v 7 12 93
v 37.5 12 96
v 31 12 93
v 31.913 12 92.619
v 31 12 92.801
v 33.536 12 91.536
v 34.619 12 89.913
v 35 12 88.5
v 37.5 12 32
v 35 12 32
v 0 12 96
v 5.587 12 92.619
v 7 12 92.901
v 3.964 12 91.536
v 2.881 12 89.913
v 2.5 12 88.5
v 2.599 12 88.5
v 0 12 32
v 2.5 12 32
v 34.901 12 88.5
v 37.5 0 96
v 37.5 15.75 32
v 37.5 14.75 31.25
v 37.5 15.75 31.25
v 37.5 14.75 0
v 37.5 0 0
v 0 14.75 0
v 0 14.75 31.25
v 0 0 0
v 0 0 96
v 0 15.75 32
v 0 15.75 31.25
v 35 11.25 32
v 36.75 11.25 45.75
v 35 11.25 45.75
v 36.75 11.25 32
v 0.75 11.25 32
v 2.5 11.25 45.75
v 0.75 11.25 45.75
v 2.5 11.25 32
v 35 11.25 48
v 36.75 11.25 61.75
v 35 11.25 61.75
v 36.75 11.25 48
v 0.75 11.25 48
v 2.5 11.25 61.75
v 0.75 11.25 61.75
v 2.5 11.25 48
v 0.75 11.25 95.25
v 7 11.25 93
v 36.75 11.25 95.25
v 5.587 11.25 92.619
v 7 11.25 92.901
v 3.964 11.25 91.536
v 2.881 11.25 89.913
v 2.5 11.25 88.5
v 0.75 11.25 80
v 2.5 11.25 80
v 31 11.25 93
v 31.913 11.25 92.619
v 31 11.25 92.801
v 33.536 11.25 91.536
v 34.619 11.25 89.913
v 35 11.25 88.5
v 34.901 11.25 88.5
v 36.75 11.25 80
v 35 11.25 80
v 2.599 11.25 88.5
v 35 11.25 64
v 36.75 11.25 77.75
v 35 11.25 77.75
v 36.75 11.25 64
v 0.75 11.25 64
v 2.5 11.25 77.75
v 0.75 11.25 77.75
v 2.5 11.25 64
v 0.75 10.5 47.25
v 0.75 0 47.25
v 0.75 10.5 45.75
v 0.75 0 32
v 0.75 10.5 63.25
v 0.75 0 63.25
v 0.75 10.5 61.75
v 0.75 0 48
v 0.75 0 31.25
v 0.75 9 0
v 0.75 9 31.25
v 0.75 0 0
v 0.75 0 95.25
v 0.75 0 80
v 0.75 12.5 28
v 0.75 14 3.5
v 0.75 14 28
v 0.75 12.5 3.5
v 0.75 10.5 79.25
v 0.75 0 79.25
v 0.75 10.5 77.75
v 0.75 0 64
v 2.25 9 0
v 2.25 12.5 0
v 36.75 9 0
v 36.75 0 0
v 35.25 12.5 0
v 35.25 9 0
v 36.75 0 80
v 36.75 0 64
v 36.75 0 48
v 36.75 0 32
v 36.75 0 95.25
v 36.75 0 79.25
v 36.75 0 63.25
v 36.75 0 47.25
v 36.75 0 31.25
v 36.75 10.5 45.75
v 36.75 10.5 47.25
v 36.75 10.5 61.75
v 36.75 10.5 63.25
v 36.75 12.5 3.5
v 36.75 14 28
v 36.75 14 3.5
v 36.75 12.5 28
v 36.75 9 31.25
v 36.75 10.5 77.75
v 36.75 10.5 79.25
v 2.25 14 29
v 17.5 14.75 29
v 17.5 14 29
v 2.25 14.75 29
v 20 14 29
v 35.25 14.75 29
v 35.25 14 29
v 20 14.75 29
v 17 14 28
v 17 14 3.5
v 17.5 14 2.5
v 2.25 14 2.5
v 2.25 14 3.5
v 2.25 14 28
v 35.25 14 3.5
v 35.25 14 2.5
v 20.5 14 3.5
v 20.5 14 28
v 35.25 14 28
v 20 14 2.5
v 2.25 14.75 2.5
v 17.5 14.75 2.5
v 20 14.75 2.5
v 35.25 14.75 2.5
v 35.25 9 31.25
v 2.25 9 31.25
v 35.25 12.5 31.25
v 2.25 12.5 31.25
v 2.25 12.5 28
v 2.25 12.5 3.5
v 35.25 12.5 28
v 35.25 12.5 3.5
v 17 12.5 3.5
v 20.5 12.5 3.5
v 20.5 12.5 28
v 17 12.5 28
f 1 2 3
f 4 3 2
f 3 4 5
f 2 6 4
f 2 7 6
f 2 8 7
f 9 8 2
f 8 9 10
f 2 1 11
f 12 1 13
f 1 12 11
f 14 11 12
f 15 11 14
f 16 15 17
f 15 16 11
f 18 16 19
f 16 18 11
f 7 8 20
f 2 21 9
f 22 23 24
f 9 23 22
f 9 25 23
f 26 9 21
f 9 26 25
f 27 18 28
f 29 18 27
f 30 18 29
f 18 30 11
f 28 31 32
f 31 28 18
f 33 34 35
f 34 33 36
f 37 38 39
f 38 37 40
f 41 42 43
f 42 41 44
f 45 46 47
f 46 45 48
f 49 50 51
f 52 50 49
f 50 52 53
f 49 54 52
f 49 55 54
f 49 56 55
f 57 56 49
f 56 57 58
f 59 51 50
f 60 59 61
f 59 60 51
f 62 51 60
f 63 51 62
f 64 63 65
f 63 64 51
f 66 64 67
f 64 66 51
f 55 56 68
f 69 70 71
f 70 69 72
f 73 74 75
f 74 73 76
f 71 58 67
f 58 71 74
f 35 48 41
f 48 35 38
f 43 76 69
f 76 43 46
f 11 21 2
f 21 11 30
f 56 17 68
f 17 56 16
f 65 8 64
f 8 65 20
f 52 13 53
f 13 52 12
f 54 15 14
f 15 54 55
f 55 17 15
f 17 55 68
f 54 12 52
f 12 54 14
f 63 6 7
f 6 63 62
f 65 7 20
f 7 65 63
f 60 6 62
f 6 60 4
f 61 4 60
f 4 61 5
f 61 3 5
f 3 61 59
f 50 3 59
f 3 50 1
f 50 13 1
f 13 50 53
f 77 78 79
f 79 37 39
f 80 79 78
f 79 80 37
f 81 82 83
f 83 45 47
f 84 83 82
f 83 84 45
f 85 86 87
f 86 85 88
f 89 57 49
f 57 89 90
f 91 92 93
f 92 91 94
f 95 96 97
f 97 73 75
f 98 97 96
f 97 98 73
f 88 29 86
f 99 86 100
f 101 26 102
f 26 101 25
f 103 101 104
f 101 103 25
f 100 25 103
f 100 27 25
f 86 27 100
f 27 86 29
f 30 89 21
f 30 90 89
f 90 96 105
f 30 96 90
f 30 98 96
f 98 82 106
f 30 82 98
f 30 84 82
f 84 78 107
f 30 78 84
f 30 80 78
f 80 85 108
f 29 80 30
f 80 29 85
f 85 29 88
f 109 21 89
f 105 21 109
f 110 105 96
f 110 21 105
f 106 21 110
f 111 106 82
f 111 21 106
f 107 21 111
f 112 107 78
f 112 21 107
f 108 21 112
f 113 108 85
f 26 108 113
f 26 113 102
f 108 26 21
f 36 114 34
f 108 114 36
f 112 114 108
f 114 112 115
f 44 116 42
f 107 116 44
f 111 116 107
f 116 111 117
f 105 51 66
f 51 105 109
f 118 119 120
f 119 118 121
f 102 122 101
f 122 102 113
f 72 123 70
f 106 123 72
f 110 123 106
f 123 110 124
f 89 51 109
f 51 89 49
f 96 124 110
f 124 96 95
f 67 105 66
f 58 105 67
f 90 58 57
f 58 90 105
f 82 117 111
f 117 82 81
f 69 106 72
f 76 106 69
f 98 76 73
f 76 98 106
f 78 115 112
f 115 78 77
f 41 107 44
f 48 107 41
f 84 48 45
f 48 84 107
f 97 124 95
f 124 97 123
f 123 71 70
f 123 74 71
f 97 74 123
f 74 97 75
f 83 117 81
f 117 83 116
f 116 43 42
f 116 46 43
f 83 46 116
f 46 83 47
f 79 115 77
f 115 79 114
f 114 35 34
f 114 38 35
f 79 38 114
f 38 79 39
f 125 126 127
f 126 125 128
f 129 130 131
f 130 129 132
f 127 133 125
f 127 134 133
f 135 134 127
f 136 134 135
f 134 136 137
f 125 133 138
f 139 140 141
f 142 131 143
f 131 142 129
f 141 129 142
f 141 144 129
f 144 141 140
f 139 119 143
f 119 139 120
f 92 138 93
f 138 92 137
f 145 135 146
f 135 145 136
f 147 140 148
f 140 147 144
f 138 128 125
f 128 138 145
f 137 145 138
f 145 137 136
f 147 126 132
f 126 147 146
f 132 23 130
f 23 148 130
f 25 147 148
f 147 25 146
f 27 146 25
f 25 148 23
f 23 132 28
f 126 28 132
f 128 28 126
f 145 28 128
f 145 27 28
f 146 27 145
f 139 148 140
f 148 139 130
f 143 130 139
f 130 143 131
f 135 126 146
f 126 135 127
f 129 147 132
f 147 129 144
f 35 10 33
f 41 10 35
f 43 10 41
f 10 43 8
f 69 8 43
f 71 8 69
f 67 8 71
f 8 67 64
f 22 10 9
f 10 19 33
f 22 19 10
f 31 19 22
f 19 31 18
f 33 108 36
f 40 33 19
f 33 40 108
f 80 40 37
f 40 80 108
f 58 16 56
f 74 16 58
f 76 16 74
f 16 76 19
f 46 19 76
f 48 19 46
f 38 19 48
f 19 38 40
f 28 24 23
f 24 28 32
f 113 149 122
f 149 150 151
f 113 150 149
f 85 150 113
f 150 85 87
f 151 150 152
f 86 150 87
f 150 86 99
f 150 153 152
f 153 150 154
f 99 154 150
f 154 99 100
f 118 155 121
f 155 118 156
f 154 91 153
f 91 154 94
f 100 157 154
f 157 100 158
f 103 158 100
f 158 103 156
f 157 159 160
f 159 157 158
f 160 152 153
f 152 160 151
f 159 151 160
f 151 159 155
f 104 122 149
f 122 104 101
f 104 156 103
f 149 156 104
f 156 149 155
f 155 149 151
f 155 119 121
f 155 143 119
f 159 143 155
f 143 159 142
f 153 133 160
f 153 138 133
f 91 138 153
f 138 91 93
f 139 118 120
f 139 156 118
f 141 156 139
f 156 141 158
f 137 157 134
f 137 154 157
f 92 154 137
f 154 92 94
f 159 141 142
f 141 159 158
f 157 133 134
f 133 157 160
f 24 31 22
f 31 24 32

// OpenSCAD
// file: lumber.scad
//----------------------------------------------------------------------
//------------ openscad module for common (framing) lumber -------------
// A.P. Ruymgaart 5/2015
//------------------------------- notes --------------------------------
// This work is licensed under a creative commons license:
// Attribution-NonCommercial 4.0 International (CC BY-NC 4.0) 
// You are free to:
//    Share - copy and redistribute the material in any medium or format
//    Adapt - remix, transform, and build upon the material 
// Under the following terms:\
//    Attribution - You must give appropriate credit, provide a link to the license, 
//    and indicate if changes were made. You may do so in any reasonable manner, 
//    but not in any way that suggests the licensor endorses you or your use.
//
// NonCommercial - You may not use the material for commercial purposes. 
// https://creativecommons.org/licenses/by-nc/4.0/legalcode
//----------------------------------------------------------------------

h1xX = 0.75;

w2x2 = 1.5;
w2x4 = 3.5;
w4x4 = 3.5;
w2x6 = 5.5;
w2x8 = 7.5;
w2x10 = 9.5;

d2x4 = 1.5;
d2x6 = 1.5;
d2x8 = 1.5;
d2x10 = 1.5;

w14x14 = 14.0;

opacityFrame = 1.0;


//----------------------------------------------------------------------
module ss1x8(x, y, z, rx, ry, rz, length, color="green", opc=1.0) 
{
   echo("====> LUMBER: 1x12x8");

   color(color,opc)
      translate([x, y, z])
         rotate([rx,ry,rz])
            cube([h1xX,7.5,length]);    
}


//----------------------------------------------------------------------
module ss1x6(x, y, z, rx, ry, rz, length, color="green", opc=1.0) 
{
   echo("====> LUMBER: 1x12x8");

   color(color,opc)
      translate([x, y, z])
         rotate([rx,ry,rz])
            cube([h1xX,5.5,length]);    
}

//----------------------------------------------------------------------
module ss1x2(x, y, z, rx, ry, rz, length, color="green", opc=1.0) 
{
   echo("====> LUMBER: 1x12x8");

   color(color,opc)
      translate([x, y, z])
         rotate([rx,ry,rz])
            cube([h1xX,1.5,length]);    
}

//----------------------------------------------------------------------
module ss1x3(x, y, z, rx, ry, rz, length, color="green", opc=1.0) 
{
   echo("====> LUMBER: 1x12x8");

   color(color,opc)
      translate([x, y, z])
         rotate([rx,ry,rz])
            cube([h1xX,2.5,length]);    
}

//----------------------------------------------------------------------
module ss1x4(x, y, z, rx, ry, rz, length, color="green", opc=1.0) 
{
   echo("====> LUMBER: 1x12x8");

   color(color,opc)
      translate([x, y, z])
         rotate([rx,ry,rz])
            cube([h1xX,3.5,length]);    
}

//----------------------------------------------------------------------
module ss1x16(x, y, z, rx, ry, rz, length, color="green", opc=1.0) 
{
   echo("====> LUMBER: 1x12x8");

   color(color,opc)
      translate([x, y, z])
         rotate([rx,ry,rz])
            cube([h1xX,15.75,length]);    
}

//----------------------------------------------------------------------
module ss1x12(x, y, z, rx, ry, rz, len, color="green", opc=1.0) 
{
   echo("====> LUMBER: 1x12x8");

   color(color,opc)
      translate([x, y, z])
         rotate([rx,ry,rz])
            cube([h1xX,11.25,len]);    
}

//----------------------------------------------------------------------
module ss1x12x8(x, y, z, rx, ry, rz, color="green", opc=1.0) 
{
   echo("====> LUMBER: 1x12x8");

   color(color,opc)
      translate([x, y, z])
         rotate([rx,ry,rz])
            cube([h1xX,11.25,96]);    
}

//----------------------------------------------------------------------
module ss1x12x3(x, y, z, rx, ry, rz, color="green", opc=1.0) 
{
   echo("====> LUMBER: 1x12x8");

   color(color,opc)
      translate([x, y, z])
         rotate([rx,ry,rz])
            cube([h1xX,11.25,36]);    
}

//----------------------------------------------------------------------
module ss2x4(x, y, z, rx, ry, rz, length, color="green", opc=1.0) 
{
   echo("====> LUMBER: 2x4 l=",length);

   color(color,opc)
      translate([x, y, z])
         rotate([rx,ry,rz])
            cube([w2x4,d2x4,length]);    
}

//----------------------------------------------------------------------
module ss2x6(x, y, z, rx, ry, rz, length, color="green", opc=1.0) 
{
   echo("====> LUMBER: 2x6 l=",length);

   color(color,opc)
      translate([x, y, z])
         rotate([rx,ry,rz])
            cube([w2x6,d2x6,length]);    
}

//----------------------------------------------------------------------
module ss2x6x8(x, y, z, rx, ry, rz, color="green", opc=1.0, cut=0.0) 
{
   echo("====> LUMBER: 2x6x12 l=",length);

   color(color,opc)
      translate([x, y, z])
         rotate([rx,ry,rz])
            cube([w2x6,d2x6,96-cut]);    
}

//----------------------------------------------------------------------
module ss2x6x10(x, y, z, rx, ry, rz, color="green", opc=1.0, cut=0.0) 
{
   echo("====> LUMBER: 2x6x12 l=",length);

   color(color,opc)
      translate([x, y, z])
         rotate([rx,ry,rz])
            cube([w2x6,d2x6,120-cut]);    
}

//----------------------------------------------------------------------
module ss2x6x12(x, y, z, rx, ry, rz, color="green", opc=1.0) 
{
   echo("====> LUMBER: 2x6x12 l=",length);

   color(color,opc)
      translate([x, y, z])
         rotate([rx,ry,rz])
            cube([w2x6,d2x6,144]);    
}

//----------------------------------------------------------------------
module ss2x6x14(x, y, z, rx, ry, rz, color, opc=1.0) 
{
   echo("====> LUMBER: 2x6x12 l=",length);

   color(color,opc)
      translate([x, y, z])
         rotate([rx,ry,rz])
            cube([w2x6,d2x6,168]);    
}

//----------------------------------------------------------------------
module ss2x6x18(x, y, z, rx, ry, rz, color, opc=1.0, cut=0.0) 
{
   echo("====> LUMBER: 2x6x12 l=",length);

   color(color,opc)
      translate([x, y, z])
         rotate([rx,ry,rz])
            cube([w2x6,d2x6,216-cut]);    
}

//----------------------------------------------------------------------
module ss2x6x20(x, y, z, rx, ry, rz, color="green", opc=1.0, cut=0.0) 
{
   echo("====> LUMBER: 2x6x12 l=",length);

   color(color,opc)
      translate([x, y, z])
         rotate([rx,ry,rz])
            cube([w2x6,d2x6,240-cut]);    
}

//----------------------------------------------------------------------
module ss2x8(x, y, z, rx, ry, rz, length, color, opc) 
{
   echo("====> LUMBER: 2x6 l=",length);

   color(color,opc)
      translate([x, y, z])
         rotate([rx,ry,rz])
            cube([w2x8,d2x8,length]);    
}

//----------------------------------------------------------------------
module ss2x10(x, y, z, rx, ry, rz, length, color, opc) 
{
   echo("====> LUMBER: 2x6 l=",length);

   color(color,opc)
      translate([x, y, z])
         rotate([rx,ry,rz])
            cube([w2x10,d2x10,length]);    
}

//----------------------------------------------------------------------
module ss4x4(x, y, z, rx, ry, rz, length, color, opc) 
{
   echo("====> LUMBER: 2x4 l=",length);

   color(color,opc)
      translate([x, y, z])
         rotate([rx,ry,rz])
            cube([w4x4,w4x4,length]);    
}

//----------------------------------------------------------------------
module ss14x14(x, y, z, rx, ry, rz, length, color, opc) 
{
   echo("====> LUMBER: 2x4 l=",length);

   color(color,opc)
      translate([x, y, z])
         rotate([rx,ry,rz])
            cube([14,14,length]);    
}

//----------------------------------------------------------------------
module ss2x2(x, y, z, rx, ry, rz, length, color, opc) 
{
   echo("====> LUMBER: 2x4 l=",length);

   color(color,opc)
      translate([x, y, z])
         rotate([rx,ry,rz])
            cube([w2x2,w2x2,length]);    
}


//----------------------------------------------------------------------
//ss2x4(0,0,0, 0,0,0, 30.0);
//ss4x4(-10,-10,10, 0,0,0, 50, "Blue", 0.5);
// main file
//----------------------------------------------------------------------
//-------------- openscad module for library style bookcase ------------
// Author: A.P. Ruymgaart
//----------------------------------------------------------------------
// Dimensions: 8' (96") tall, 36" shelf width
//    this a a narrow & tall version
//    a double version exists and is essentially two of these joined side to side
//------------------------------- notes --------------------------------
// This work is licensed under a creative commons license:
// Attribution-NonCommercial 4.0 International (CC BY-NC 4.0) 
// You are free to:
//    Share - copy and redistribute the material in any medium or format
//    Adapt - remix, transform, and build upon the material 
// Under the following terms:\
//    Attribution - You must give appropriate credit, provide a link to the license, 
//    and indicate if changes were made. You may do so in any reasonable manner, 
//    but not in any way that suggests the licensor endorses you or your use.
//
// NonCommercial - You may not use the material for commercial purposes. 
// https://creativecommons.org/licenses/by-nc/4.0/legalcode
//----------------------------------------------------------------------

include <lumber.scad>;

/*** 1x12 sides and shelves ***/

ss1x12x8(    0,0,0, 0,0,0);
ss1x12x8(36.75,0,0, 0,0,0);

ss1x12x3(0.75,0,96, 0,90,0);
ss1x12x3(0.75,0,80, 0,90,0);
ss1x12x3(0.75,0,64, 0,90,0);
ss1x12x3(0.75,0,48, 0,90,0);


/*** 1x2 ***/

//- under shelves - front, support
ss1x2(0.75,10.5,77.75, 90,0,90, 36, color="yellow");
ss1x2(0.75,10.5,61.75, 90,0,90, 36, color="yellow");
ss1x2(0.75,10.5,45.75, 90,0,90, 36, color="yellow");

//- door frame (left & right)
ss1x2(2.25,14, 2.5, 0,0,90, 26.5, color="yellow");
ss1x2(36.75,14, 2.5, 0,0,90, 28.5, color="yellow");


/*** 1x3 ***/

//- door frame, top, bottom & center
ss1x3(0.75,14,29, 90,0,90, 36, color="aquamarine");
ss1x3(0.75,14,0, 90,0,90, 36, color="aquamarine");
ss1x3(20.0,14, 2.5, 0,0,90, 26.5, color="aquamarine");

//- end=11.25 and need end - 1.5 - 0.75 = 9.0
ss1x3(37.5,11.25,32, 0,0,90, 58, color="aquamarine");
ss1x3( 2.5,11.25,32, 0,0,90, 58, color="aquamarine");


/*** 1x4 ***/

ss1x4(    0,11.25,0, 0,0,0, 31.25, color="brown");
ss1x4(36.75,11.25,0, 0,0,0, 31.25, color="brown");


/*** 2x4 ***/

ss2x4(2.25,9.0,0, 0,0,90, 31.25, color="blue");
ss2x4(36.75,9.0,0, 0,0,90, 31.25, color="blue");

ss2x4(0.75,12.5,31.5, 0,90,0, 36, color="blue");
ss2x4(0.75,12.5, 3.5, 0,90,0, 36, color="blue");

ss2x4(17,12.5, 3.5, 0,0,0, 24.5, color="blue");


/*** 1x16 tabletop ***/
ss1x16(0.0,0,32,0,90,0,37.5, color="red");


/*** 1x8 ***/

difference()
{
ss1x8(0.0,11.25,88.5, 90,0,90, 37.5,color="turquoise");

translate([7.5,10,88]) 
    rotate([90,0,0])
        cylinder(h=15, r=5, center=true);

translate([30,10,88]) 
    rotate([90,0,0])
        cylinder(h=15, r=5, center=true);

      translate([7, 5, 87])
            cube([24,10,6]);   
}


 
